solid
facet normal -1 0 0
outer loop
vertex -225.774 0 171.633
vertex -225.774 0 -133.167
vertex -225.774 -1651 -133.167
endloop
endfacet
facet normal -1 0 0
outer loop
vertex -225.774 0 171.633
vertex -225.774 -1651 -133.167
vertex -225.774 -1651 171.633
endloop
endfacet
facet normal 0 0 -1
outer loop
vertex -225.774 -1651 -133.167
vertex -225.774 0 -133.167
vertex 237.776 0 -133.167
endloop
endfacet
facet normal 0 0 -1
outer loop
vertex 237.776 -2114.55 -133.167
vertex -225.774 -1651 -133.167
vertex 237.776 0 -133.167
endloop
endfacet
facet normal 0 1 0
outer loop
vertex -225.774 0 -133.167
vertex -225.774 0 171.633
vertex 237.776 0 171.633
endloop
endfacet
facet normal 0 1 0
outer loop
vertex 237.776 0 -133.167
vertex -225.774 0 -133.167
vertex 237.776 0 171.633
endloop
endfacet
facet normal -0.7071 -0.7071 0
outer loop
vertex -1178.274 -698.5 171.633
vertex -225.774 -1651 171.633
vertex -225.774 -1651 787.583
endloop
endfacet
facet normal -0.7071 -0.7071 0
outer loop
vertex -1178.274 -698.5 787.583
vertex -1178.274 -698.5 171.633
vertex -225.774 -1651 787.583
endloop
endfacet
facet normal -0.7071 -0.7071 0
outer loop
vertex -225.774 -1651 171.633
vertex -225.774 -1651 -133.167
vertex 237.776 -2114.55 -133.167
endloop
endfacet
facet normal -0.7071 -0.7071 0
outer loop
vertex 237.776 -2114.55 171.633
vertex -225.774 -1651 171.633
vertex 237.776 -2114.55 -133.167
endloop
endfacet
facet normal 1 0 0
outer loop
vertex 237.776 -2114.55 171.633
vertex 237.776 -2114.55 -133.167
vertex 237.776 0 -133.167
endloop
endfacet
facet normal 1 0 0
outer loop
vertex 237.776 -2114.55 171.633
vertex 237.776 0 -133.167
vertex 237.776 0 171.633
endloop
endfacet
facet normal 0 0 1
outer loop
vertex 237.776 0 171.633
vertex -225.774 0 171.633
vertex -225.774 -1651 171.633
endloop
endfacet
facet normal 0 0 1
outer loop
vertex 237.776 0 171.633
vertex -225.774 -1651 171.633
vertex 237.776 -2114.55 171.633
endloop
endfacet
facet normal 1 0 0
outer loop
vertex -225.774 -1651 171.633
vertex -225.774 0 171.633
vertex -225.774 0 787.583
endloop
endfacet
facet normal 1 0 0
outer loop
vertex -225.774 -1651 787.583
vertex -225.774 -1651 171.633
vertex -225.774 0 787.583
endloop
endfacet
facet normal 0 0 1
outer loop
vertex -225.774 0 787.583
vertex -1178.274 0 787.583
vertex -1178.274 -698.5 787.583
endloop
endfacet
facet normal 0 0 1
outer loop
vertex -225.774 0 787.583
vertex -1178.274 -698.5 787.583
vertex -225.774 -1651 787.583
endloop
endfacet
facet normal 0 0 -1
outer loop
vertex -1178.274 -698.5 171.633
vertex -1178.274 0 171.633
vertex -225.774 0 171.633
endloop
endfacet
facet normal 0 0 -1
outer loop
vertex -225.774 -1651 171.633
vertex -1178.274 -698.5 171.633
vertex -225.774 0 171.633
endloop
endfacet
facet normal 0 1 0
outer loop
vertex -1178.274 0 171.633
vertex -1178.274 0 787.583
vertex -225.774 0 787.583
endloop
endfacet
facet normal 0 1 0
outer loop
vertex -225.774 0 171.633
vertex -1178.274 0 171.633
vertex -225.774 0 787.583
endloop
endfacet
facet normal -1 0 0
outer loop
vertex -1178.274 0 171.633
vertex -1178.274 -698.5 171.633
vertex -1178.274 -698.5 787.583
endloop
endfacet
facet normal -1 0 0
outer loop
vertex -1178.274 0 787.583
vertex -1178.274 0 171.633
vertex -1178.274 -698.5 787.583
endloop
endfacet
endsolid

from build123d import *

# Parameters (mm, degrees)
F1_W        = 463.55
F1_H        = 304.8
F2_DEPTH    = 2120.9
F1_W_2      = 952.5
F1_H_2      = 615.95
F3_DEPTH    = 1651
F4_T1_DEPTH = 2721.6676720904
F5_SIZE     = 952.49999


# Not quite as in the source:
# - a fillet or chamfer that OpenCascade refuses, or shapes differently, is made with other operations: its cross-section is extruded or revolved along the edge and cut away or added
# - a fillet or chamfer is up to 0.001 mm smaller than in the source, because OpenCascade refuses the exact size


with BuildPart() as f2:
    # F1 (on face) → F2 (new body)
    with BuildSketch(Plane.XZ):
        with Locations((6.0013753094, 19.2331727594)):
            Rectangle(F1_W, F1_H)
    extrude(amount=F2_DEPTH)

    # F4: chamfer of 469.9 on 1 edges, made by hand

    # F4_s2 → F4_t1 (cut)
    with BuildSketch(Plane.XY.offset(-1341.6006632858)):
        Polygon((-225.7736246906, -1651), (244.1263753094, -2120.9), (-225.7736246906, -2120.9), align=None)
    extrude(amount=F4_T1_DEPTH, mode=Mode.SUBTRACT)


with BuildPart() as f3:
    # F1 (on face) → F3 (new body)
    with BuildSketch(Plane.XZ):
        with Locations((-702.0236246906, 479.6081727594)):
            Rectangle(F1_W_2, F1_H_2)
    extrude(amount=F3_DEPTH)

    # F5 (size 952.5 in the source; OpenCascade refuses exactly that, so slightly less here)
    f5_edges = [f3.edges().sort_by_distance(p)[0] for p in [
        (-1178.273625, -1651, 479.608173),
    ]]
    chamfer(f5_edges, length=F5_SIZE)


solid = Compound([f2.part, f3.part])
